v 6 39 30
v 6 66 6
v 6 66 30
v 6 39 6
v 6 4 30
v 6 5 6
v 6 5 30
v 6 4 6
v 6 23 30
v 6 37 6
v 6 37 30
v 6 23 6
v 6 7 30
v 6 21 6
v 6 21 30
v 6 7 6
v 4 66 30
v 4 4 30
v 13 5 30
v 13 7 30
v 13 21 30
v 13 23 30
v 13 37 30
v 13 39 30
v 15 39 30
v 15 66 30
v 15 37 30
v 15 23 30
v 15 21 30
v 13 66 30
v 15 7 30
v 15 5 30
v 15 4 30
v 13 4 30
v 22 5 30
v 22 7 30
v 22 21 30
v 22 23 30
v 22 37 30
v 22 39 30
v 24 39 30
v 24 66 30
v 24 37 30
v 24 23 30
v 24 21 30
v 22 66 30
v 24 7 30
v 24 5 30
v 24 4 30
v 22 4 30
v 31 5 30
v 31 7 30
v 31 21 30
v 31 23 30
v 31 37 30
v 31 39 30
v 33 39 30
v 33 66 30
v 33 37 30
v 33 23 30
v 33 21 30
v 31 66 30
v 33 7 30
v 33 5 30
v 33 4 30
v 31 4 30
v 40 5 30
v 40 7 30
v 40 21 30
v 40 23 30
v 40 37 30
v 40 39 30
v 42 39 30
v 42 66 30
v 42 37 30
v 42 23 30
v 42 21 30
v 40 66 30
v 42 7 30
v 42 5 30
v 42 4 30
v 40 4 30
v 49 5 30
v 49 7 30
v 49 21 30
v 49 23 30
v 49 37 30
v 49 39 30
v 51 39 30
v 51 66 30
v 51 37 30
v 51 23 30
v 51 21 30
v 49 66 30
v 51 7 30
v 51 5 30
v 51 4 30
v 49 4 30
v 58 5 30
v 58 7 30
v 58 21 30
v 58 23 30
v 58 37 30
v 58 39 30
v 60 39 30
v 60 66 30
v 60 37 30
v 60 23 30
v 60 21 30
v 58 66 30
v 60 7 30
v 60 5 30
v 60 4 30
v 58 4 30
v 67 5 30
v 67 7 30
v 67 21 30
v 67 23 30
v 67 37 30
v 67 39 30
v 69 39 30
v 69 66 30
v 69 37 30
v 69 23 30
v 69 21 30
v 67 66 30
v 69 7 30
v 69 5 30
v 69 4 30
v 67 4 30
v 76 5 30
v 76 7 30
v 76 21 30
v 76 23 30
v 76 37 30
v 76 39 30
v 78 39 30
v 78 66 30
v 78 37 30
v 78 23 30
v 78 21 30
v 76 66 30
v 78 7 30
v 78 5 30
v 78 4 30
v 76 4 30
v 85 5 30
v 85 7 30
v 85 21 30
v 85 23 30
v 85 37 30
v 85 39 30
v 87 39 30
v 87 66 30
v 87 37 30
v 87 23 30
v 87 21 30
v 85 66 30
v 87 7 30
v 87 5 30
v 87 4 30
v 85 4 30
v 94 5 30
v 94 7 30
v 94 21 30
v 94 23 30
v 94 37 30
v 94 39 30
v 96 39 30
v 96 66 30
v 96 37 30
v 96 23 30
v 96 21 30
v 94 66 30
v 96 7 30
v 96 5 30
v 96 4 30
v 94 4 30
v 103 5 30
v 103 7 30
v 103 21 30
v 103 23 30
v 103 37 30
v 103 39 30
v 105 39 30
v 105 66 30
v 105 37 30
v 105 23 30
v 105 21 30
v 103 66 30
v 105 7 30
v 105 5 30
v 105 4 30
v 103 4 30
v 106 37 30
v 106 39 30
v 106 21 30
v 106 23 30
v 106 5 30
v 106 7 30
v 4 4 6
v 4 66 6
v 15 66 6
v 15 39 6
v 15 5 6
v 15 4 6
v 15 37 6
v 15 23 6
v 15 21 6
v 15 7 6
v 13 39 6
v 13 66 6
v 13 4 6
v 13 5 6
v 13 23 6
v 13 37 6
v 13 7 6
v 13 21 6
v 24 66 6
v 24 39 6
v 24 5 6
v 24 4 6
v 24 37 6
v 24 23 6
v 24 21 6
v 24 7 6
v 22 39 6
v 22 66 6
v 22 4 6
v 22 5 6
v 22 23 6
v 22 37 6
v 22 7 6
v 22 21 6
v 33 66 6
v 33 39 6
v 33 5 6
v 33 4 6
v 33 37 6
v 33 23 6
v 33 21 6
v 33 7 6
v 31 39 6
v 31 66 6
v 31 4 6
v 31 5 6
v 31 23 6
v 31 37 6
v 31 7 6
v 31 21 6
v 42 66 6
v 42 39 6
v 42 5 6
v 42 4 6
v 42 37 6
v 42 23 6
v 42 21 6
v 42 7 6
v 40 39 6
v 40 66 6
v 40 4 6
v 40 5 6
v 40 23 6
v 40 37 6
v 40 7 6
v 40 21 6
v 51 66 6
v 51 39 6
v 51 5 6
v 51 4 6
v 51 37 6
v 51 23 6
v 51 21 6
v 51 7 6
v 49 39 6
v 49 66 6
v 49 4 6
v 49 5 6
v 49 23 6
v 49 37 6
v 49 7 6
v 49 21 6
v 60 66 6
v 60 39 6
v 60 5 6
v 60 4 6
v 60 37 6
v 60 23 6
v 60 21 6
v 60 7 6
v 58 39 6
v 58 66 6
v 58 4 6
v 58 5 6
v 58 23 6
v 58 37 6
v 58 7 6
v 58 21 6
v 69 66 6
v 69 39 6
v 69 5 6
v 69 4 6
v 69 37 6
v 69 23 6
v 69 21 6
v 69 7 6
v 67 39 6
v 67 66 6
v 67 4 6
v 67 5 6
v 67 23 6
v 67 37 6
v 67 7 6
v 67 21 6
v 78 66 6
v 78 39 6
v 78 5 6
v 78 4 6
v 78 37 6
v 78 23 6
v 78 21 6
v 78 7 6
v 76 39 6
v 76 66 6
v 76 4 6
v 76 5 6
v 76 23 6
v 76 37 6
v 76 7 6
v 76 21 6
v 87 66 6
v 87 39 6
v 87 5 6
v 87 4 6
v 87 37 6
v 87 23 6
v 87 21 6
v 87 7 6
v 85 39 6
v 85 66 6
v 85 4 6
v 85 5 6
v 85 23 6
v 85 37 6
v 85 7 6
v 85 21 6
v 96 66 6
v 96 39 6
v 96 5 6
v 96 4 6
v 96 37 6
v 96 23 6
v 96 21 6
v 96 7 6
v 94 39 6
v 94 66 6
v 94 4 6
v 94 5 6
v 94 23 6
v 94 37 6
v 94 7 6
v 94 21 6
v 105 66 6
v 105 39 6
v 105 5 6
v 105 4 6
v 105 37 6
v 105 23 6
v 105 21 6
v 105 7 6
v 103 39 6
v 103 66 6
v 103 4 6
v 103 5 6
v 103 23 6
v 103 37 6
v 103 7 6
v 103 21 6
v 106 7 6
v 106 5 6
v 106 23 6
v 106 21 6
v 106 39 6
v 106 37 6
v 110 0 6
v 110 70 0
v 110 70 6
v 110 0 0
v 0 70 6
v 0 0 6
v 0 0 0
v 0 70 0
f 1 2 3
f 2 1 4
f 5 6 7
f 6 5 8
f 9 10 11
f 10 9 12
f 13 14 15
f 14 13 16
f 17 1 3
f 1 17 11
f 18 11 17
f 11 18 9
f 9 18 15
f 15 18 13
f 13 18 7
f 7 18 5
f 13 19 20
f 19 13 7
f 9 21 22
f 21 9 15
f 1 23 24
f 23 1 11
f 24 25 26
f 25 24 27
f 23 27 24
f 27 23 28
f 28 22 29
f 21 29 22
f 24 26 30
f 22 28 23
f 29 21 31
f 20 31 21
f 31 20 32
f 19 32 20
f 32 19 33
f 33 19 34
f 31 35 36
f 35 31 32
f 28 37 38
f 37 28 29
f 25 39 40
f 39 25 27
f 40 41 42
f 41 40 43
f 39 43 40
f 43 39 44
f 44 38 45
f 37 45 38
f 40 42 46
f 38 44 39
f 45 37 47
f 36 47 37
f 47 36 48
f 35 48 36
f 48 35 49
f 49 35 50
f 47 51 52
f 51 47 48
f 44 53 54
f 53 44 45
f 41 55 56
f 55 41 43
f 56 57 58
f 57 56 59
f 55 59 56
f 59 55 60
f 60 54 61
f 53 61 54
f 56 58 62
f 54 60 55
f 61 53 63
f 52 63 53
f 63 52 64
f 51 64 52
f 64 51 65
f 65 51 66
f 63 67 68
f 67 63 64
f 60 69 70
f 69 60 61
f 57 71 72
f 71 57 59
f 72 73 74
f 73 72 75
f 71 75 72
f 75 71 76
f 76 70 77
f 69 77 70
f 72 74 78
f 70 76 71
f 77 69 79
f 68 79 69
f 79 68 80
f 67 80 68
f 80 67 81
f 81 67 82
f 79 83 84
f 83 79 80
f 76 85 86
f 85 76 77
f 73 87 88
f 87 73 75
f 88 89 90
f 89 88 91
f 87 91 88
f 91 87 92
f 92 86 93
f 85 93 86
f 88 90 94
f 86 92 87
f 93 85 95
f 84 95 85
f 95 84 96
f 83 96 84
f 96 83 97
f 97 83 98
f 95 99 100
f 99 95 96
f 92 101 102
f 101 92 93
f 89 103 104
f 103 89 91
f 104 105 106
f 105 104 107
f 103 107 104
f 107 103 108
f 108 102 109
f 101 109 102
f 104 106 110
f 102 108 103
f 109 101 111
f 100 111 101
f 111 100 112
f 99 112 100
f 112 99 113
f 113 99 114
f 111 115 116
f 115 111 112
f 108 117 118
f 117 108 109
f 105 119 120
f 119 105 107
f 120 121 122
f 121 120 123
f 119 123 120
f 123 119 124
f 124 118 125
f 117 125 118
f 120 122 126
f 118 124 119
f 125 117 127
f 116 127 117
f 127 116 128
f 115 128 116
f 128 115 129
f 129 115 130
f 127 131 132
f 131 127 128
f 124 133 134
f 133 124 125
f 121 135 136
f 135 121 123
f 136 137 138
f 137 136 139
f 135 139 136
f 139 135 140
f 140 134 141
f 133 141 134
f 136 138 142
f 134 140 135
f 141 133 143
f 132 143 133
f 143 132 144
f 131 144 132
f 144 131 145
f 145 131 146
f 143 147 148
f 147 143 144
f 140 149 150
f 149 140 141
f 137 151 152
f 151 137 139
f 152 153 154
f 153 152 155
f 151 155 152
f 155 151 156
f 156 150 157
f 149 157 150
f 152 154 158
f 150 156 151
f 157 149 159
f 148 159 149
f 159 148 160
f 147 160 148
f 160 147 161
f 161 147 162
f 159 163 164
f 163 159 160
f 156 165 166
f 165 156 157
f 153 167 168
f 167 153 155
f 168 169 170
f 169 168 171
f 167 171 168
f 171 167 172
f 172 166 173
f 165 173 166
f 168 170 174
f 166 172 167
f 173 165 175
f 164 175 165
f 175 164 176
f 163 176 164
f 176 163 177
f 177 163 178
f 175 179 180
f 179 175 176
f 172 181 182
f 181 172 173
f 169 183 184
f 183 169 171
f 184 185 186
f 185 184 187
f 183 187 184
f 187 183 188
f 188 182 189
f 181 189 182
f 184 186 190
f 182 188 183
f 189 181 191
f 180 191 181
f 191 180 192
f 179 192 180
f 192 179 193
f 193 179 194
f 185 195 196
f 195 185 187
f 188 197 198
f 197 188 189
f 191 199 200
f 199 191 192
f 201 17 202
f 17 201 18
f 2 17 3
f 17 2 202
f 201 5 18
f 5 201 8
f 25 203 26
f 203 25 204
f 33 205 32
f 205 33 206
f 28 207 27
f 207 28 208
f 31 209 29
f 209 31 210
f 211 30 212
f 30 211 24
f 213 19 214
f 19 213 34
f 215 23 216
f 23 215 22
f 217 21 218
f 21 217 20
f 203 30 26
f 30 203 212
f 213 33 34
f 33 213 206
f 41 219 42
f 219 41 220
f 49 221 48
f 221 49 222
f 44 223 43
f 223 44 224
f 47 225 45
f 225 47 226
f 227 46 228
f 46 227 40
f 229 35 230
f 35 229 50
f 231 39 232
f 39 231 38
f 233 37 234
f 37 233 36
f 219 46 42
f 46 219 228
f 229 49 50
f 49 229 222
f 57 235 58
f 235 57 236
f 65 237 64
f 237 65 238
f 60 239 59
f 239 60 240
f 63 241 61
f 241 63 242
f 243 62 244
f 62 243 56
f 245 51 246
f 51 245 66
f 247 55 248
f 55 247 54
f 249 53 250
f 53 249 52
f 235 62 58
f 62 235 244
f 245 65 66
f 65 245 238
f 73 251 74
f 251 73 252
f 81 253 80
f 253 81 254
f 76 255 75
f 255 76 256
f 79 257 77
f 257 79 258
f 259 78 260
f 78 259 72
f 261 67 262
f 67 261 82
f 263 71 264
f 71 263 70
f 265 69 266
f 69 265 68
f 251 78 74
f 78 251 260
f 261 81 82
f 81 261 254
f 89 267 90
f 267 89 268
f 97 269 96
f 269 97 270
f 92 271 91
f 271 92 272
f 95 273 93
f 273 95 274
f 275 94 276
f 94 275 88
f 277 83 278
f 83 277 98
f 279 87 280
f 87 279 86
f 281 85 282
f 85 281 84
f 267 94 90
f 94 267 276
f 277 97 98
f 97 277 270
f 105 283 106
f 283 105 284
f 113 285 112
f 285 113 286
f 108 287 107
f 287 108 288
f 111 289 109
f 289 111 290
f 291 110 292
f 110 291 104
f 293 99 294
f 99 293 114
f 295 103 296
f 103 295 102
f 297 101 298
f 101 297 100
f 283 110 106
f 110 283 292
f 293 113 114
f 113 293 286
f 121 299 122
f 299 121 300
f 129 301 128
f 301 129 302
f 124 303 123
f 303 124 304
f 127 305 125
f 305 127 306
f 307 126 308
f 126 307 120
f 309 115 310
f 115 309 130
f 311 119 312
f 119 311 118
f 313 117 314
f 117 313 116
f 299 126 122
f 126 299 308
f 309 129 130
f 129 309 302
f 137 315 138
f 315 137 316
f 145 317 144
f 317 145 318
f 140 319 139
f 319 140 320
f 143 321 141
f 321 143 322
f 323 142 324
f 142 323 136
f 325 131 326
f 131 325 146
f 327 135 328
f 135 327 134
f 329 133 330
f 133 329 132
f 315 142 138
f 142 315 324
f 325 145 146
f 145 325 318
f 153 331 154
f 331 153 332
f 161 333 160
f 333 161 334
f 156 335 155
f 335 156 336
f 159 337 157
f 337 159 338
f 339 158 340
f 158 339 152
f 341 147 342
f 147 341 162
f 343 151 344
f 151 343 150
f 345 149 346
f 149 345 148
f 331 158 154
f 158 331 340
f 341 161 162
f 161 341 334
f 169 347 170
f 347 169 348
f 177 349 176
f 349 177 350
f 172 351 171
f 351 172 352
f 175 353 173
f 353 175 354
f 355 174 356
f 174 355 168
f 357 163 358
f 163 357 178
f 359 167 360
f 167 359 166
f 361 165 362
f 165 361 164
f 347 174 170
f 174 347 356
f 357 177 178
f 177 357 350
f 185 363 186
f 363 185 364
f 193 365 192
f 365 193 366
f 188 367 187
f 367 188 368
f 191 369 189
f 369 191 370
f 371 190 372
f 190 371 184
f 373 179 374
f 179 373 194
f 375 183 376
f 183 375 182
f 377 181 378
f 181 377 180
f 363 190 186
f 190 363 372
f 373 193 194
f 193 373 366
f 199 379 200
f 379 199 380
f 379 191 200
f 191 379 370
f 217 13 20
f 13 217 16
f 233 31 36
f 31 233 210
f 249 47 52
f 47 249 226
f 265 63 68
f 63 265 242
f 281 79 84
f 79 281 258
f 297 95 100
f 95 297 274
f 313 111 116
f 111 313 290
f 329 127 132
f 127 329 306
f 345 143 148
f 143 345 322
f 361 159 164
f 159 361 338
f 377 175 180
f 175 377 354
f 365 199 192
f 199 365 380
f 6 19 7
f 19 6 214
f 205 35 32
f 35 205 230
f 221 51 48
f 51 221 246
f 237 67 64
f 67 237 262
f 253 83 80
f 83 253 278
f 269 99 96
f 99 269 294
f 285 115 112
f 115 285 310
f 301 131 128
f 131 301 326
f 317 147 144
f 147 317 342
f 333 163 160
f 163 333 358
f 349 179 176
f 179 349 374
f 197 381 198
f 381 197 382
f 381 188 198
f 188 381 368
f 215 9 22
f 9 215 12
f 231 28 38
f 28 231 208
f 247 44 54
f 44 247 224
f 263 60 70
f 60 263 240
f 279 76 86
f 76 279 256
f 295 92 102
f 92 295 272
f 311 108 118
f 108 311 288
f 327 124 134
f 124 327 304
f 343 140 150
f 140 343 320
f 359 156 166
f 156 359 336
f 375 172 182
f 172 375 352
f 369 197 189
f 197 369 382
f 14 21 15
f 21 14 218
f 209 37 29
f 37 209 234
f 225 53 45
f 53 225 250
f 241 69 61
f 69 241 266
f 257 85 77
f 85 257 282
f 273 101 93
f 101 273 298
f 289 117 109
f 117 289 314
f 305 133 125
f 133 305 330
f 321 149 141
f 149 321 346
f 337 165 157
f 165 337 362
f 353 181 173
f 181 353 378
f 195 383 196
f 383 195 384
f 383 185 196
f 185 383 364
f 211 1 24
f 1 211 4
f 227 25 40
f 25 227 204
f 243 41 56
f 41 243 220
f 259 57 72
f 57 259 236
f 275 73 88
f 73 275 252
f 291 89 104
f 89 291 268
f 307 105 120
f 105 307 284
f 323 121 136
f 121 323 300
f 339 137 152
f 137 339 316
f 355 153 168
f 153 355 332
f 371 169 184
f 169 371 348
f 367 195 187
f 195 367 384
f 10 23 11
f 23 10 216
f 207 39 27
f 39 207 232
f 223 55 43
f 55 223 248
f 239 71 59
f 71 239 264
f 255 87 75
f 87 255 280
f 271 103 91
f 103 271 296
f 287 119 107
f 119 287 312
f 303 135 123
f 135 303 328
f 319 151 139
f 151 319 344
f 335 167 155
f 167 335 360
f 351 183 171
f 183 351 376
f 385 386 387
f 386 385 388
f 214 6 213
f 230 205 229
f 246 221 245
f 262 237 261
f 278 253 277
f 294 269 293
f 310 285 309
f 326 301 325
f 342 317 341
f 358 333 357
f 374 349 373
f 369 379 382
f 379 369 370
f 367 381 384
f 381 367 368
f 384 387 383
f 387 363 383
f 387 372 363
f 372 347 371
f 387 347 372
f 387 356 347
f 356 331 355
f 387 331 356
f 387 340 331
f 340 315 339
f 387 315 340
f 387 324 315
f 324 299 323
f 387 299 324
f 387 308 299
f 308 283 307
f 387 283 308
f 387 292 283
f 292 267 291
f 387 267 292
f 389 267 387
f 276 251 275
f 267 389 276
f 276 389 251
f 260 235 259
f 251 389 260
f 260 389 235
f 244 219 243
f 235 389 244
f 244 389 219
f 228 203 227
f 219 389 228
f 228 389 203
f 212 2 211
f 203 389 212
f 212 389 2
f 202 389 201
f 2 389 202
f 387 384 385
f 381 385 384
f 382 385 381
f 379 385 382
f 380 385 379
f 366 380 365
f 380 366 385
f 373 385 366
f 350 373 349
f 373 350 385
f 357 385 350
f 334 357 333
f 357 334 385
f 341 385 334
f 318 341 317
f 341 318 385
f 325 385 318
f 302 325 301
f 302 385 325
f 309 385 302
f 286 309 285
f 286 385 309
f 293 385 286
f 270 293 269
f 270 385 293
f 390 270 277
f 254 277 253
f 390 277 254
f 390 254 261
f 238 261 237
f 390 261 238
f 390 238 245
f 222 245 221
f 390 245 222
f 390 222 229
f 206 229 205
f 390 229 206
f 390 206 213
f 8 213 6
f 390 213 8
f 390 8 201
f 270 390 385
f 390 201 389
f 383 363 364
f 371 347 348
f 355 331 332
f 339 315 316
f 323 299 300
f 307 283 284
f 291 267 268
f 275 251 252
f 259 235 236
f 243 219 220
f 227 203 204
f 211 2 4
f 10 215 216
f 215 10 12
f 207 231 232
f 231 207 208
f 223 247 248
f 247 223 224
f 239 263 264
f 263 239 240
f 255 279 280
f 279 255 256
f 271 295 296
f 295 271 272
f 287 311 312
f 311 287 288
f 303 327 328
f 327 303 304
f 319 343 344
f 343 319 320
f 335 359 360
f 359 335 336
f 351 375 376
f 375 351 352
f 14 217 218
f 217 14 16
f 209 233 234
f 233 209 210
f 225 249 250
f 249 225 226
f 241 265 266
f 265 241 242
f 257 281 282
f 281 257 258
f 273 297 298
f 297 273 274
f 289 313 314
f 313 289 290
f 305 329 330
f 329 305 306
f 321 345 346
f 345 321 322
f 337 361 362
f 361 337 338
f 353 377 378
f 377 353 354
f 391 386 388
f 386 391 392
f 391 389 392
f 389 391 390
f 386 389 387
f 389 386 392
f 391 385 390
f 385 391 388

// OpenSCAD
$fn = 32;

// ----------------------------------------------------------------------
// Heatsink: cross fin block
// ----------------------------------------------------------------------

// --- parameters (mm) ---
base_l = 110;             // base length, X
base_w = 70;              // base width, Y
base_t = 6;               // base plate thickness
fin_h = 25;               // fin height above the base
fin_t = 2;                // fin thickness
edge = 4;                 // margin from the base ends
pitch = 9;                // fin pitch
rib_pitch = 16;           // cross rib pitch
fit_tol = 0.1;            // tolerance for press fits, mm
free_tol = 0.3;           // tolerance for clearance fits, mm

n_fins = floor((base_l - 2 * edge - fin_t) / pitch) + 1;  // fin count
total_h = base_t + fin_h - 1;  // overall height
n_ribs = floor((base_w - 2 * edge) / rib_pitch);  // rib count

union() {
  cube([base_l, base_w, base_t]);
  for (i = [0 : n_fins - 1])
    translate([edge + i * pitch, edge, base_t - 1])
      cube([fin_t, base_w - 2 * edge, fin_h]);
  for (i = [0 : n_ribs - 1])
    translate([edge, edge + 1 + i * rib_pitch, base_t - 1])
      cube([base_l - 2 * edge, fin_t, fin_h]);
}
